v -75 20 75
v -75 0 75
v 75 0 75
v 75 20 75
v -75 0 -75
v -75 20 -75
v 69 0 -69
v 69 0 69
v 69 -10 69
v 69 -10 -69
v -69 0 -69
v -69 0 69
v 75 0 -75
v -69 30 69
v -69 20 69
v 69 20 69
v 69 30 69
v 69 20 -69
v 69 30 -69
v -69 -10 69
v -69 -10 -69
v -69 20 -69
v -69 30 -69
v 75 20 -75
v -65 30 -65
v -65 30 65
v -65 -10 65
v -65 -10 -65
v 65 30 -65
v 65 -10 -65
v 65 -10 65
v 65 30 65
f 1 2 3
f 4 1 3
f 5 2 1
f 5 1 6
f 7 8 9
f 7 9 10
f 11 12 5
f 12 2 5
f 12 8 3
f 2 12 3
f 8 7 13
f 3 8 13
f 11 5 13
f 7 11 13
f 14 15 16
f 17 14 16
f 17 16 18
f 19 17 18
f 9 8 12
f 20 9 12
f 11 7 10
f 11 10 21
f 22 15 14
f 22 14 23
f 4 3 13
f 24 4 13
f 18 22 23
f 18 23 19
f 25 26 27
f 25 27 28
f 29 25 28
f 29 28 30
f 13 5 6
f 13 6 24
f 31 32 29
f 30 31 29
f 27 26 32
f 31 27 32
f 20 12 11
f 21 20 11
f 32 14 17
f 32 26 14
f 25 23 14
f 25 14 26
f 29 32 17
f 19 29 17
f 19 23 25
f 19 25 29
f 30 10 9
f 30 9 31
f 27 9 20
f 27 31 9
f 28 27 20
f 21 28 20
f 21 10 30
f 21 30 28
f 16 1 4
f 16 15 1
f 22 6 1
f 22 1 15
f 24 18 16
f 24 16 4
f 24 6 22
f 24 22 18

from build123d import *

# Parameters (mm, degrees)
SKETCH_1_W          = 150
SKETCH_1_H          = 150
EXTRUDE_1_DEPTH     = 20
SKETCH_2_W          = 138
SKETCH_2_H          = 138
EXTRUDE_2_DEPTH     = 10
SKETCH_3_W          = 138
SKETCH_3_H          = 138
EXTRUDE_3_DEPTH     = 10
SKETCH_4_W          = 130
SKETCH_4_H          = 130
CUT_EXTRUDE_1_DEPTH = 114.357840488


with BuildPart() as part:
    # Эскиз1 → Бобышка-Вытянуть1 (new body)
    with BuildSketch(Plane(origin=(0, 0, 0), x_dir=(1, 0, 0), z_dir=(0, 1, 0))):
        Rectangle(SKETCH_1_W, SKETCH_1_H)
    extrude(amount=EXTRUDE_1_DEPTH)

    # Эскиз2 → Бобышка-Вытянуть2 (add)
    with BuildSketch(Plane(origin=(0, 20, 0), x_dir=(1, 0, 0), z_dir=(0, 1, 0))):
        Rectangle(SKETCH_2_W, SKETCH_2_H)
    extrude(amount=EXTRUDE_2_DEPTH)

    # Эскиз3 → Бобышка-Вытянуть3 (add)
    with BuildSketch(Plane(origin=(0, 0, 0), x_dir=(-1, 0, 0), z_dir=(0, -1, 0))):
        Rectangle(SKETCH_3_W, SKETCH_3_H)
    extrude(amount=EXTRUDE_3_DEPTH)

    # Эскиз4 → Вырез-Вытянуть1 (cut, through all)
    with BuildSketch(Plane(origin=(0, 30, 0), x_dir=(1, 0, 0), z_dir=(0, 1, 0))):
        Rectangle(SKETCH_4_W, SKETCH_4_H)
    extrude(amount=-CUT_EXTRUDE_1_DEPTH, mode=Mode.SUBTRACT)


solid = part.part
